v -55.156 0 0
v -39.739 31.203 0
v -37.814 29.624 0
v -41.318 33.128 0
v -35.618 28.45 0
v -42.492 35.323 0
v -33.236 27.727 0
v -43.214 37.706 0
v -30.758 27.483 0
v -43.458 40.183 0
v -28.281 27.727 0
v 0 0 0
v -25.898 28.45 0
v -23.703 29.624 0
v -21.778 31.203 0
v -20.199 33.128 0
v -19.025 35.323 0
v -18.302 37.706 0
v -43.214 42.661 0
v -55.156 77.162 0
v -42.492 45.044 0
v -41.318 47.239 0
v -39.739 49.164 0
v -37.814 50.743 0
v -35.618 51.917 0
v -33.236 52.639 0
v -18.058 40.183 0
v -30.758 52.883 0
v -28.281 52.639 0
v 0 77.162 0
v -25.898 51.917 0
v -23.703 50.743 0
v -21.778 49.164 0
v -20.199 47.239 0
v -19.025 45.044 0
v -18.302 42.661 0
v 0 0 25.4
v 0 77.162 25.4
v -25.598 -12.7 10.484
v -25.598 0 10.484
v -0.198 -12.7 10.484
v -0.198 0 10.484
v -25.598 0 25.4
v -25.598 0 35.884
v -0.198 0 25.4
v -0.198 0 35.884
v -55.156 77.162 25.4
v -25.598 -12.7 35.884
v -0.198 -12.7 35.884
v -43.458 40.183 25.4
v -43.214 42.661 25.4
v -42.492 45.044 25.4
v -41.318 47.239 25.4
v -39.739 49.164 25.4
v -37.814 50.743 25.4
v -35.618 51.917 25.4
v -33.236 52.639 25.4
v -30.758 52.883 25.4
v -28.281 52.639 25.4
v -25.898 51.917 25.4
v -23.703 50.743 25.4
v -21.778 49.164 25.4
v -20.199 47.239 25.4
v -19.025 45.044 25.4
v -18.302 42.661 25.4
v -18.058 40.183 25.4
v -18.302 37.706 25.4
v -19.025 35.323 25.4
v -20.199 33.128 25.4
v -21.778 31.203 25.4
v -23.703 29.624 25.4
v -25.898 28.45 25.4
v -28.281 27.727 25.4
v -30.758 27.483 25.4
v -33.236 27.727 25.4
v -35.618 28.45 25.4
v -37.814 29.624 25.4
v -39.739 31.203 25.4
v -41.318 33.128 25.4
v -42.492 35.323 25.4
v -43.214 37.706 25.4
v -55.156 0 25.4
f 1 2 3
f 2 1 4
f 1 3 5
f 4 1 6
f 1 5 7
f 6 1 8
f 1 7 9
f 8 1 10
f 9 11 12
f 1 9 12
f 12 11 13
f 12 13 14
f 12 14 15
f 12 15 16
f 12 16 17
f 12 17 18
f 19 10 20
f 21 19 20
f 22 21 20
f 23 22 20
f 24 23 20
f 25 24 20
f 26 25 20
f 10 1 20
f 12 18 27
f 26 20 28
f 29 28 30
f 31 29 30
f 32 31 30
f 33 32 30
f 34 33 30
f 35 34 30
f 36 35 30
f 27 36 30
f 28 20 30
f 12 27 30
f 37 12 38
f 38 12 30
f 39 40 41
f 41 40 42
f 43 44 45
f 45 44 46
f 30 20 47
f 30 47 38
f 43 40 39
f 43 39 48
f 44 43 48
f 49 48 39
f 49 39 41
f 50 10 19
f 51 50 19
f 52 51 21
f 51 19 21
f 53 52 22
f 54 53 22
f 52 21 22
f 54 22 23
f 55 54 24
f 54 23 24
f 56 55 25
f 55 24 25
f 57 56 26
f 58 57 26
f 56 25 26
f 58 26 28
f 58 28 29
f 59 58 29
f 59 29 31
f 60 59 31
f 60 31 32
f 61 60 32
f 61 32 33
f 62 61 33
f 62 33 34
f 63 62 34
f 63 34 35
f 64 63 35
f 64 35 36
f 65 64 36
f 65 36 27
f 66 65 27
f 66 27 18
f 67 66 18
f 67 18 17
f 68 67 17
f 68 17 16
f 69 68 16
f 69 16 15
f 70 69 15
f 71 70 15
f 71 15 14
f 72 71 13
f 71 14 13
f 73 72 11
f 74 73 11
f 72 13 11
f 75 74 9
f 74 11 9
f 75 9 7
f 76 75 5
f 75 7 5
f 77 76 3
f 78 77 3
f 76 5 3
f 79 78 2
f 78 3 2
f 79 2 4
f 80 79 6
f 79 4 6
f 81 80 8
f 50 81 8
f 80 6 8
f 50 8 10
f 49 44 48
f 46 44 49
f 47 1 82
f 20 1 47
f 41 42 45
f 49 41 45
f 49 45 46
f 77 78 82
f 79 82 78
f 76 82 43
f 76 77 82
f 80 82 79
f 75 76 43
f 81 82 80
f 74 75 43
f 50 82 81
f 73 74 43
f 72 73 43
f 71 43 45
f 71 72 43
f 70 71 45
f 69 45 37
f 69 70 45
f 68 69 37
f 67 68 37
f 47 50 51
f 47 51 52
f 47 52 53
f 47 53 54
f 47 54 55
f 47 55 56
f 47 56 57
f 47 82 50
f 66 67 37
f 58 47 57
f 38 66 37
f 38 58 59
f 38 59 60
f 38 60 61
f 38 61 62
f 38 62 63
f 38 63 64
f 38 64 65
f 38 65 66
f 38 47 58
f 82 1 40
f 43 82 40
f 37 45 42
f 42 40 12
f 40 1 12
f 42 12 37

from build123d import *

# Parameters (mm, degrees)
F0_W     = 55.156417
F0_H     = 77.16199
F1_DEPTH = 25.4
F3_D     = 25.4
F4_W     = 25.4
F4_H     = 25.4
F5_DEPTH = 12.7


with BuildPart() as f1:
    # F0 (on Top) → F1 (new body)
    with BuildSketch(Plane.XY):
        with Locations((-27.578208, 38.580995)):
            Rectangle(F0_W, F0_H)
    extrude(amount=F1_DEPTH)

    # F3 (through all)
    with Locations(Plane.XY.offset(25.4)):
        with Locations((-30.758334, 40.183466)):
            Hole(F3_D / 2)

    # F4 (on face) → F5 (join)
    with BuildSketch(Plane.XZ):
        with Locations((-12.898058, 23.184226)):
            Rectangle(F4_W, F4_H)
    extrude(amount=F5_DEPTH)


solid = f1.part
